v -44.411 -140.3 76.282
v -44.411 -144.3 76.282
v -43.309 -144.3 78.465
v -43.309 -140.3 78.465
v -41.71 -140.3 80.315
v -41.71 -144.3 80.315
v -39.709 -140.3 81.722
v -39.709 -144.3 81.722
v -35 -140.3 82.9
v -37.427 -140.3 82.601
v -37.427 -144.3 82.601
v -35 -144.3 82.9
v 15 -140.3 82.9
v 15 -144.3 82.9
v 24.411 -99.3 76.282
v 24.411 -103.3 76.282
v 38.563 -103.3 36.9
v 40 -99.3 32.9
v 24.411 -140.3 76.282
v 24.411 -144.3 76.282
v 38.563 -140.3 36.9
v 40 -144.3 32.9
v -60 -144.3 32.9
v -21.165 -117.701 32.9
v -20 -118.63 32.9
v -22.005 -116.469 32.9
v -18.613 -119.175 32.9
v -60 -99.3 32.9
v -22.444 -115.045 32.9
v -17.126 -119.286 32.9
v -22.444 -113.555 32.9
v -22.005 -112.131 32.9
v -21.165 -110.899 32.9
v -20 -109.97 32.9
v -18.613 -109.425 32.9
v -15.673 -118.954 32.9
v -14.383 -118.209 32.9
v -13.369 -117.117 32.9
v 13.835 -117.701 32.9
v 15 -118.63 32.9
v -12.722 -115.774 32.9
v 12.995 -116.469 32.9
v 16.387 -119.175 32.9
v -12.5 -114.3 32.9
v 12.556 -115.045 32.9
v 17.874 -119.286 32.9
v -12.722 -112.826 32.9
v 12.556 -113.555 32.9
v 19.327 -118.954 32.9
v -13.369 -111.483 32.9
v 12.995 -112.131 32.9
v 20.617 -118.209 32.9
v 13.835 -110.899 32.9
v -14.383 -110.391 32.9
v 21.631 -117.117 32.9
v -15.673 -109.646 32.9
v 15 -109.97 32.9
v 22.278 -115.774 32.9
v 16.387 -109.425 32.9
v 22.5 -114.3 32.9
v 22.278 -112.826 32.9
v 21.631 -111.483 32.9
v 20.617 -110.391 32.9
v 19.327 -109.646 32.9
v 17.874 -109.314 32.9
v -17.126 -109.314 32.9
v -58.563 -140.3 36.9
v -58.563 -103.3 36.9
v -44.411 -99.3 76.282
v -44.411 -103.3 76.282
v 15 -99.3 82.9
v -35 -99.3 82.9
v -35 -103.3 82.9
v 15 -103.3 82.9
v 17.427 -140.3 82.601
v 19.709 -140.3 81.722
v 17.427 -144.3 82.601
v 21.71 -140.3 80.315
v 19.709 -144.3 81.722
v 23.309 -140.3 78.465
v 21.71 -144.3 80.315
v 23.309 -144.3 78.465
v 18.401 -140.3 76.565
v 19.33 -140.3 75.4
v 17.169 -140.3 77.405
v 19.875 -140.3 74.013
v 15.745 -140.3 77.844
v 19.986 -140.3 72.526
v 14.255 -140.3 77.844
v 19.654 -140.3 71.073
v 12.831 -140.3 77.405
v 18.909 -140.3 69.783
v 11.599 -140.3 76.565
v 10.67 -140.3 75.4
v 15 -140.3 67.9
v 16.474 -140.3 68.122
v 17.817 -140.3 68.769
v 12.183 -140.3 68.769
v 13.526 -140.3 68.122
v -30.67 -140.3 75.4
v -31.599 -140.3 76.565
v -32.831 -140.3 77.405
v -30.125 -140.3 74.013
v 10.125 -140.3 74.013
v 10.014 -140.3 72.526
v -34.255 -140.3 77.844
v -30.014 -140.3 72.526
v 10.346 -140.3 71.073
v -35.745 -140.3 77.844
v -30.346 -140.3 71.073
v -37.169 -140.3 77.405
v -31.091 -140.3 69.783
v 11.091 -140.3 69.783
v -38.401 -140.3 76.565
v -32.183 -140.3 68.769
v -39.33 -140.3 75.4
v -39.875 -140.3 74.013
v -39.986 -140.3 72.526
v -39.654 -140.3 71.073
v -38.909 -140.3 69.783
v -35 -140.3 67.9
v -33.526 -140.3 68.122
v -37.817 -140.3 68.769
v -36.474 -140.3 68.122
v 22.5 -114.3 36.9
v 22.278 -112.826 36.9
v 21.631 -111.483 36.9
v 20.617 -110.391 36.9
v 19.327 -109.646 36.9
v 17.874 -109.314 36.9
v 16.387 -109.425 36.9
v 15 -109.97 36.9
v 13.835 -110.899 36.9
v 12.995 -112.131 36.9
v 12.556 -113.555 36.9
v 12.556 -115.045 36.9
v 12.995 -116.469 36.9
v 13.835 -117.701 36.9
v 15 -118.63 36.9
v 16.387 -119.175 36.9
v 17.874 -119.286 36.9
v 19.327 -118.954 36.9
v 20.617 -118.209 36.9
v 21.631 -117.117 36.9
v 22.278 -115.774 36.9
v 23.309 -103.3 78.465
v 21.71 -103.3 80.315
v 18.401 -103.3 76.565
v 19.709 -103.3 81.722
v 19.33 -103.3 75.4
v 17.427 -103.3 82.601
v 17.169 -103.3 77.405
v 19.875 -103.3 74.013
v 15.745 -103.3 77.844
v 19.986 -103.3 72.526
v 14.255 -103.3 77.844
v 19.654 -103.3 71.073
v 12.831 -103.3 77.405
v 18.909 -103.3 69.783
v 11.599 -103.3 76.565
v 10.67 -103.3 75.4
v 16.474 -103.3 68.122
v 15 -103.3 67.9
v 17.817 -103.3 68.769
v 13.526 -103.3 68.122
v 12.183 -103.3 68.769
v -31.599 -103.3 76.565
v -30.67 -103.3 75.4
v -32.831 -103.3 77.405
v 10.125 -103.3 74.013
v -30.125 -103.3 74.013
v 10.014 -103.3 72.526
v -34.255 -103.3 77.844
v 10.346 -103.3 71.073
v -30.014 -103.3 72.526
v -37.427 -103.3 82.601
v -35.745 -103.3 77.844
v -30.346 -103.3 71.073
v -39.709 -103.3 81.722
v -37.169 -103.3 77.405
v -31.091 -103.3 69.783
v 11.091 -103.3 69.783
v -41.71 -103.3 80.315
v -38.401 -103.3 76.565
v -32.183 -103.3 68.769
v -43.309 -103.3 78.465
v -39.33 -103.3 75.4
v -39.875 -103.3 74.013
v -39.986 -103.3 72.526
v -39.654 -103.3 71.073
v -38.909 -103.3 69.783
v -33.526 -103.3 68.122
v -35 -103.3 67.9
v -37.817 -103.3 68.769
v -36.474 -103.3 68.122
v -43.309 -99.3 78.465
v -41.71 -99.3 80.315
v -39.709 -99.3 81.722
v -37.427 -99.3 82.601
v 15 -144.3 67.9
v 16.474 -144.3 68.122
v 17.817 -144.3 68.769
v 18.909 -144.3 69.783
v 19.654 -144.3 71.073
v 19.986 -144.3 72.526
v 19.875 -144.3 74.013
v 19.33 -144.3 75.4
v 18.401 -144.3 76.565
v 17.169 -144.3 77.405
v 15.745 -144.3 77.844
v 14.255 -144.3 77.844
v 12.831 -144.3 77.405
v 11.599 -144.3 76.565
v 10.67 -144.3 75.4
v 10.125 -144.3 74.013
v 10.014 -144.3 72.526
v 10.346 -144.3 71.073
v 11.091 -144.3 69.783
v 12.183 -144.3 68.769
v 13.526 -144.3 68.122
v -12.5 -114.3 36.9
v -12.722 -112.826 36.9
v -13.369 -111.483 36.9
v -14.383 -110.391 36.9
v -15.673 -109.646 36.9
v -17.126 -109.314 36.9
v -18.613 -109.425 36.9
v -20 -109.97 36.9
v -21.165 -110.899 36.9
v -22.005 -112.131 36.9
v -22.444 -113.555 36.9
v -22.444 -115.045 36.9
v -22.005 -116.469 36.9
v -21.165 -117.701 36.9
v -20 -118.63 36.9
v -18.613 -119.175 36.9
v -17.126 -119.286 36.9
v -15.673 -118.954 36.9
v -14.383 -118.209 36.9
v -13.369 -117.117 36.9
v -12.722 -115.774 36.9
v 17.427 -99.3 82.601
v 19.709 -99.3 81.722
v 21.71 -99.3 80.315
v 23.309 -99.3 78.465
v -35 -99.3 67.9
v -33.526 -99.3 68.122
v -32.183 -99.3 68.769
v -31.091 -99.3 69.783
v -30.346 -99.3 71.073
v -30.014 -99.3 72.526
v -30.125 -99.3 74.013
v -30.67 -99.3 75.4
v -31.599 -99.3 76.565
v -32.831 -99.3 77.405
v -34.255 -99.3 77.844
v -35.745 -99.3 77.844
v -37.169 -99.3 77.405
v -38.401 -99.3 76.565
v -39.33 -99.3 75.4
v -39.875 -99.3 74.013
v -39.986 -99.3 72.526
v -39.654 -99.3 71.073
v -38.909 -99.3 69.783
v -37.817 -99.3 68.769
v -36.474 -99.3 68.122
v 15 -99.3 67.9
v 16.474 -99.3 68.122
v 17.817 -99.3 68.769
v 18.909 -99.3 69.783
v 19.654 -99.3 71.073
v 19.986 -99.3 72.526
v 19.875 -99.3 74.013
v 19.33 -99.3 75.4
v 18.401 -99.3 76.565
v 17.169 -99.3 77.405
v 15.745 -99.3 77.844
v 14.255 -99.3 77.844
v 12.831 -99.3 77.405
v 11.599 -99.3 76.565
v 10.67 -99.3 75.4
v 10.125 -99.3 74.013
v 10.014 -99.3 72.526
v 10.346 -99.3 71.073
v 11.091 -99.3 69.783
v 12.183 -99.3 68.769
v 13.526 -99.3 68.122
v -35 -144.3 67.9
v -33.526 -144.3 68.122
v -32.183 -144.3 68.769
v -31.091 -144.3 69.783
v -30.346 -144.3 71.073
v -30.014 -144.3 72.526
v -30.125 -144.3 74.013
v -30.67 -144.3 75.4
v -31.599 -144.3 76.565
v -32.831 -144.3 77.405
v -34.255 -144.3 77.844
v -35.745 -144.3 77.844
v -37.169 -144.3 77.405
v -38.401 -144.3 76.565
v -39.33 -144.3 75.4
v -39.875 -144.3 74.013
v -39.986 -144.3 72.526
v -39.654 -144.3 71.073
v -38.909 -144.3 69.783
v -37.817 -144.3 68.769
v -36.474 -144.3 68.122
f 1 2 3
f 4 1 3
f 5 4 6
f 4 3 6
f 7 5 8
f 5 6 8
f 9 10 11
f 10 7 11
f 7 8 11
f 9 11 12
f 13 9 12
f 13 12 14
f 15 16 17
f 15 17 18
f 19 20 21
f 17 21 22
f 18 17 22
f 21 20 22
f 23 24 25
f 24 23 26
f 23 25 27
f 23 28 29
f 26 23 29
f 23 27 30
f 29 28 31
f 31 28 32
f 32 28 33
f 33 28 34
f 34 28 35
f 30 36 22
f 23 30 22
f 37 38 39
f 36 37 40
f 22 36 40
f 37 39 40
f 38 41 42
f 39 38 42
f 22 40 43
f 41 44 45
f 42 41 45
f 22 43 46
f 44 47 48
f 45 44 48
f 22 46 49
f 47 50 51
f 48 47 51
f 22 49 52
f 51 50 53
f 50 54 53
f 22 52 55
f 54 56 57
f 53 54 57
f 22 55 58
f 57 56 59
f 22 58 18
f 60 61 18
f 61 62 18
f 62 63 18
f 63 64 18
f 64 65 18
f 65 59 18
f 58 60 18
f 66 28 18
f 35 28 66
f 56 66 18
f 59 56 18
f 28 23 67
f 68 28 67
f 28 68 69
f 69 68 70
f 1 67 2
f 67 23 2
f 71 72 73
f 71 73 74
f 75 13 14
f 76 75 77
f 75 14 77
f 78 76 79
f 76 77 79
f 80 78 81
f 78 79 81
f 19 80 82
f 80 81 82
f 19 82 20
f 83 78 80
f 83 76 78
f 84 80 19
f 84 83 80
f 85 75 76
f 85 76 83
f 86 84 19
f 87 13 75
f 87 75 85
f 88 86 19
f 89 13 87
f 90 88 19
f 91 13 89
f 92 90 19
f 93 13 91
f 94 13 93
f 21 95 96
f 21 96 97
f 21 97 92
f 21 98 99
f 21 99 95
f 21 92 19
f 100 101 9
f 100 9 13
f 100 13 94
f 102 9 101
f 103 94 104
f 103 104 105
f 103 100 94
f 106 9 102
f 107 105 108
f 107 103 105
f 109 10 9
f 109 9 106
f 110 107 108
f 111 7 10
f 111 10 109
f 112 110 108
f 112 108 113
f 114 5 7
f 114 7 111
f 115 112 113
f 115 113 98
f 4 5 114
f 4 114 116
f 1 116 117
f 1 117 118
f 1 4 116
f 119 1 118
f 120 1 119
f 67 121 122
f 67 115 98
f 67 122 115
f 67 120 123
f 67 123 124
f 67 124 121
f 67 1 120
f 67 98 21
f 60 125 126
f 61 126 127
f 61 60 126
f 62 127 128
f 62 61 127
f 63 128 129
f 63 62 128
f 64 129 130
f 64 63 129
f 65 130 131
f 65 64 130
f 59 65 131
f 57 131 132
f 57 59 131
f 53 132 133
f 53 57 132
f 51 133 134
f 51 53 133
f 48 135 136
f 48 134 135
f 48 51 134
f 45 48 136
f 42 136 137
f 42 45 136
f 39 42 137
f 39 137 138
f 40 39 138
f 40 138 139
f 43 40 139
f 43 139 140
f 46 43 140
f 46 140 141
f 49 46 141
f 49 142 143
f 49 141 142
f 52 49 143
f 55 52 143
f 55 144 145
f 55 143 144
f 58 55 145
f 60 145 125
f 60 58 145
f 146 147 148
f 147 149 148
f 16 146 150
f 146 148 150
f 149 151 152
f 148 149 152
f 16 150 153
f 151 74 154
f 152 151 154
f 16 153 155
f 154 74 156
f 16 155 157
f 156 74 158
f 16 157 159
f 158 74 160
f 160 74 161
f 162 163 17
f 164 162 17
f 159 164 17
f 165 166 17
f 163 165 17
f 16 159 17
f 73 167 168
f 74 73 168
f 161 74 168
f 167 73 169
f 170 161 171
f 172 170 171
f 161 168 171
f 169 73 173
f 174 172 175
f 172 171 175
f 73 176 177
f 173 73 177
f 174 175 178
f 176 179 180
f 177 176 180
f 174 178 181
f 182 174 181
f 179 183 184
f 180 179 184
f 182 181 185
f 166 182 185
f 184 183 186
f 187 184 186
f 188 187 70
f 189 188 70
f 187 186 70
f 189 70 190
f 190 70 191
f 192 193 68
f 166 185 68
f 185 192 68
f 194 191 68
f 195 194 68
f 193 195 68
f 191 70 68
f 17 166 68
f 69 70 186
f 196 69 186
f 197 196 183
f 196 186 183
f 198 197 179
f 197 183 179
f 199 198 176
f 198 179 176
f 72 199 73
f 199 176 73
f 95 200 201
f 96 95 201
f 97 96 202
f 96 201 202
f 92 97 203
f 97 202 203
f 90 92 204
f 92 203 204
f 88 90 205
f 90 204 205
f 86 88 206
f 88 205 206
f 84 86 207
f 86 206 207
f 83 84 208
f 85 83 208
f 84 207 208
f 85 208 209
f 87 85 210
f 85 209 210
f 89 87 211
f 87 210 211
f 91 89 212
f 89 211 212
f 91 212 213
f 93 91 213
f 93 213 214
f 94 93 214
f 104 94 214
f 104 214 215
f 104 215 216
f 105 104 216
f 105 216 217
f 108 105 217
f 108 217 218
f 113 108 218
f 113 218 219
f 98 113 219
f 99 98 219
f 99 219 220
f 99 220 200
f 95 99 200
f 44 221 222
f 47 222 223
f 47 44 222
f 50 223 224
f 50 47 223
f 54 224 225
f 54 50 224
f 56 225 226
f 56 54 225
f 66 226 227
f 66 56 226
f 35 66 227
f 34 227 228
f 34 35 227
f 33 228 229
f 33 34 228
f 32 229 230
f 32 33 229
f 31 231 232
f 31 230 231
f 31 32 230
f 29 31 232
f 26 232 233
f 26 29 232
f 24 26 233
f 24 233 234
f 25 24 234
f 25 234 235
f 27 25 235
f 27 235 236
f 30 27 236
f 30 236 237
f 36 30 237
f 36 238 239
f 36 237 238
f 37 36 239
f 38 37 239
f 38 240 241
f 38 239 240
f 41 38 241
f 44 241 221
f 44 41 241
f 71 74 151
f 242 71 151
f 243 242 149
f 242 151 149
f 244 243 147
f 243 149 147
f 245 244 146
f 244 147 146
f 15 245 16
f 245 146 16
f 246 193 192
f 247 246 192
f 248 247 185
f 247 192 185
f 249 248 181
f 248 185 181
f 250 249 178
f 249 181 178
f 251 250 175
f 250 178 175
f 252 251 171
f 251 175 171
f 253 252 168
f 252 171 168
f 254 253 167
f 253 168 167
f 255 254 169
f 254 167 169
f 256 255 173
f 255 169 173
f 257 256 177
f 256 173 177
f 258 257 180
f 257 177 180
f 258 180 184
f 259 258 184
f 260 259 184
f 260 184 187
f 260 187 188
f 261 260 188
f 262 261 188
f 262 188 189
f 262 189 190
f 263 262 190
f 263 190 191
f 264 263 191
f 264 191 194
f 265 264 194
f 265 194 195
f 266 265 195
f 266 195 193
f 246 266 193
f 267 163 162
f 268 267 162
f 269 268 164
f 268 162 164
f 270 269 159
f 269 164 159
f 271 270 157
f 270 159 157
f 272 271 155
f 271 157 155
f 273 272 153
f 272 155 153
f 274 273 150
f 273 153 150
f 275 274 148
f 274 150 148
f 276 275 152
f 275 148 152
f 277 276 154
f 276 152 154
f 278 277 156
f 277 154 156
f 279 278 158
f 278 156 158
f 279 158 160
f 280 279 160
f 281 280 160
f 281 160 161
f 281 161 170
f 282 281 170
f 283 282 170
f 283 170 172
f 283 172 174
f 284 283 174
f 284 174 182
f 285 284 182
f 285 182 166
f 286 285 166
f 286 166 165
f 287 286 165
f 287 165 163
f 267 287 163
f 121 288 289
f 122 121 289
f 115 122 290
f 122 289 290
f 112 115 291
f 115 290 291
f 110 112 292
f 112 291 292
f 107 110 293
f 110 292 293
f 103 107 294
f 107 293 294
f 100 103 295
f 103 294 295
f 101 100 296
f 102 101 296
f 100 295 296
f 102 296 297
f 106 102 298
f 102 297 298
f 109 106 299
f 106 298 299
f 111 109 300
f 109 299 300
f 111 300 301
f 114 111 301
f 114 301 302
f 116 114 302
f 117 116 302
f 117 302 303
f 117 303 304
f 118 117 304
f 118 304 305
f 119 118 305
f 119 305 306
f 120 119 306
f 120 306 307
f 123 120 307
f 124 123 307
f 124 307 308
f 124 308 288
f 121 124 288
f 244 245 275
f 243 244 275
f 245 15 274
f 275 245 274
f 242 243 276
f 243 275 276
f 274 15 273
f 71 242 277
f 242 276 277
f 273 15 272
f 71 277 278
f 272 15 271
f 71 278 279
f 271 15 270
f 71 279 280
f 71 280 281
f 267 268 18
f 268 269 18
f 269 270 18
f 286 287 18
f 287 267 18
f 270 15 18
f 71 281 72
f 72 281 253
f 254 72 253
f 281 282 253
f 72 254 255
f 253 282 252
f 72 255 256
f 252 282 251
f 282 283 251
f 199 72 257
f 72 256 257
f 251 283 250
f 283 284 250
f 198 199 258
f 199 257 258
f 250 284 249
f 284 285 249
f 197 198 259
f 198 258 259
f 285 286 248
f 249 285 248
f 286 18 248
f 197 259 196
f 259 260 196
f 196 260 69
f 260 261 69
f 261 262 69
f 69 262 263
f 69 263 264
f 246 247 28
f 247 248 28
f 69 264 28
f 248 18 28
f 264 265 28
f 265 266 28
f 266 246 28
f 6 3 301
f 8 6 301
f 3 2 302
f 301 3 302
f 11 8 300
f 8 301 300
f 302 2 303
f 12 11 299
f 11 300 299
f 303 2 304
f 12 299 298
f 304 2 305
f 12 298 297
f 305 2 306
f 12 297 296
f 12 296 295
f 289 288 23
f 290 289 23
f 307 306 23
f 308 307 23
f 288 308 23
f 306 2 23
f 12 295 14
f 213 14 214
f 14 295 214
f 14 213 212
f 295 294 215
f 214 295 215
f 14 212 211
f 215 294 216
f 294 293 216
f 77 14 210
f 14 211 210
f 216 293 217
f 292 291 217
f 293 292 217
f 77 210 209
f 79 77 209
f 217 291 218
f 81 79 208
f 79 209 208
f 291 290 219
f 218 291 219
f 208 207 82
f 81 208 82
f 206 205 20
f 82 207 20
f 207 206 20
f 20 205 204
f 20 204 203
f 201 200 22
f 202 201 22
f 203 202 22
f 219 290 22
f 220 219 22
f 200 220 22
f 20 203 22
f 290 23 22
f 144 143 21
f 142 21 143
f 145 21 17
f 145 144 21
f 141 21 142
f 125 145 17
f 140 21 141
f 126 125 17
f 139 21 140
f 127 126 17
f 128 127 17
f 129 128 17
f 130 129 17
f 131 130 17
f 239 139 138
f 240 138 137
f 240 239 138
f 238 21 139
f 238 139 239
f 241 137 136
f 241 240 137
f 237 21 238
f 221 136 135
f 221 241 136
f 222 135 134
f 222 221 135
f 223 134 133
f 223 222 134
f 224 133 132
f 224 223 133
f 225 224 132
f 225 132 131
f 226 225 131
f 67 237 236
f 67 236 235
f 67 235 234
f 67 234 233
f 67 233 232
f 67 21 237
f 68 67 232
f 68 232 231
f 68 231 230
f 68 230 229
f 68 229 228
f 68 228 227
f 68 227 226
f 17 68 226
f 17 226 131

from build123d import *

# Parameters (mm, degrees)
SKETCH1_R               = 5
BOSS_EXTRUDE1_DEPTH     = 50
SKETCH2_R               = 5
CUT_EXTRUDE1_DEPTH      = 112.791815443
CUT_EXTRUDE2_DEPTH      = 177.903545314
CUT_EXTRUDE2_DEPTH_BACK = 177.903545314
SKETCH3_W               = 65.68648631
SKETCH3_H               = 37


with BuildPart() as part:
    # Sketch1 → Boss-Extrude1 (new body)
    with BuildSketch(Plane.XY.offset(32.9)):
        Polygon((-40, -144.299876296), (40, -144.299876296), (40, -99.299876296), (-40, -99.299876296), (-60, -99.299876296), (-60, -144.299876296), align=None)
        with Locations((17.5, -114.3)):
            Circle(SKETCH1_R, mode=Mode.SUBTRACT)
        with Locations((-17.5, -114.3)):
            Circle(SKETCH1_R, mode=Mode.SUBTRACT)
    extrude(amount=BOSS_EXTRUDE1_DEPTH)

    # Sketch2 → Cut-Extrude1 (cut, through all)
    with BuildSketch(Plane.XZ.offset(144.299876296)):
        with BuildLine():
            Line((-60, 82.9), (-60, 32.9))
            Line((-60, 32.9), (-44.410826478, 76.281766549))
            ThreePointArc((-44.410826478, 76.281766549), (-40.752492265, 81.07978195), (-35, 82.9))
            Line((-35, 82.9), (-60, 82.9))
        make_face()
        with BuildLine():
            Line((24.410826478, 76.281766549), (40, 32.9))
            Line((40, 32.9), (40, 82.9))
            Line((40, 82.9), (15, 82.9))
            ThreePointArc((15, 82.9), (20.752492265, 81.07978195), (24.410826478, 76.281766549))
        make_face()
        with Locations(Location((15, 72.9, 0), (0, 0, 270))):
            Circle(SKETCH2_R)
        with Locations(Location((-35, 72.9, 0), (0, 0, 270))):
            Circle(SKETCH2_R)
    extrude(amount=-CUT_EXTRUDE1_DEPTH, mode=Mode.SUBTRACT)

    # Sketch3 → Cut-Extrude2 (cut, two sides: drawn at the far end of the back side and taken through both)
    with BuildSketch(Plane(origin=(0, 0, 0), x_dir=(0, 0, -1), z_dir=(1, 0, 0)).offset(-CUT_EXTRUDE2_DEPTH_BACK)):
        with Locations((-69.743243155, -121.799876296)):
            Rectangle(SKETCH3_W, SKETCH3_H)
    extrude(amount=CUT_EXTRUDE2_DEPTH + CUT_EXTRUDE2_DEPTH_BACK, mode=Mode.SUBTRACT)


solid = part.part
